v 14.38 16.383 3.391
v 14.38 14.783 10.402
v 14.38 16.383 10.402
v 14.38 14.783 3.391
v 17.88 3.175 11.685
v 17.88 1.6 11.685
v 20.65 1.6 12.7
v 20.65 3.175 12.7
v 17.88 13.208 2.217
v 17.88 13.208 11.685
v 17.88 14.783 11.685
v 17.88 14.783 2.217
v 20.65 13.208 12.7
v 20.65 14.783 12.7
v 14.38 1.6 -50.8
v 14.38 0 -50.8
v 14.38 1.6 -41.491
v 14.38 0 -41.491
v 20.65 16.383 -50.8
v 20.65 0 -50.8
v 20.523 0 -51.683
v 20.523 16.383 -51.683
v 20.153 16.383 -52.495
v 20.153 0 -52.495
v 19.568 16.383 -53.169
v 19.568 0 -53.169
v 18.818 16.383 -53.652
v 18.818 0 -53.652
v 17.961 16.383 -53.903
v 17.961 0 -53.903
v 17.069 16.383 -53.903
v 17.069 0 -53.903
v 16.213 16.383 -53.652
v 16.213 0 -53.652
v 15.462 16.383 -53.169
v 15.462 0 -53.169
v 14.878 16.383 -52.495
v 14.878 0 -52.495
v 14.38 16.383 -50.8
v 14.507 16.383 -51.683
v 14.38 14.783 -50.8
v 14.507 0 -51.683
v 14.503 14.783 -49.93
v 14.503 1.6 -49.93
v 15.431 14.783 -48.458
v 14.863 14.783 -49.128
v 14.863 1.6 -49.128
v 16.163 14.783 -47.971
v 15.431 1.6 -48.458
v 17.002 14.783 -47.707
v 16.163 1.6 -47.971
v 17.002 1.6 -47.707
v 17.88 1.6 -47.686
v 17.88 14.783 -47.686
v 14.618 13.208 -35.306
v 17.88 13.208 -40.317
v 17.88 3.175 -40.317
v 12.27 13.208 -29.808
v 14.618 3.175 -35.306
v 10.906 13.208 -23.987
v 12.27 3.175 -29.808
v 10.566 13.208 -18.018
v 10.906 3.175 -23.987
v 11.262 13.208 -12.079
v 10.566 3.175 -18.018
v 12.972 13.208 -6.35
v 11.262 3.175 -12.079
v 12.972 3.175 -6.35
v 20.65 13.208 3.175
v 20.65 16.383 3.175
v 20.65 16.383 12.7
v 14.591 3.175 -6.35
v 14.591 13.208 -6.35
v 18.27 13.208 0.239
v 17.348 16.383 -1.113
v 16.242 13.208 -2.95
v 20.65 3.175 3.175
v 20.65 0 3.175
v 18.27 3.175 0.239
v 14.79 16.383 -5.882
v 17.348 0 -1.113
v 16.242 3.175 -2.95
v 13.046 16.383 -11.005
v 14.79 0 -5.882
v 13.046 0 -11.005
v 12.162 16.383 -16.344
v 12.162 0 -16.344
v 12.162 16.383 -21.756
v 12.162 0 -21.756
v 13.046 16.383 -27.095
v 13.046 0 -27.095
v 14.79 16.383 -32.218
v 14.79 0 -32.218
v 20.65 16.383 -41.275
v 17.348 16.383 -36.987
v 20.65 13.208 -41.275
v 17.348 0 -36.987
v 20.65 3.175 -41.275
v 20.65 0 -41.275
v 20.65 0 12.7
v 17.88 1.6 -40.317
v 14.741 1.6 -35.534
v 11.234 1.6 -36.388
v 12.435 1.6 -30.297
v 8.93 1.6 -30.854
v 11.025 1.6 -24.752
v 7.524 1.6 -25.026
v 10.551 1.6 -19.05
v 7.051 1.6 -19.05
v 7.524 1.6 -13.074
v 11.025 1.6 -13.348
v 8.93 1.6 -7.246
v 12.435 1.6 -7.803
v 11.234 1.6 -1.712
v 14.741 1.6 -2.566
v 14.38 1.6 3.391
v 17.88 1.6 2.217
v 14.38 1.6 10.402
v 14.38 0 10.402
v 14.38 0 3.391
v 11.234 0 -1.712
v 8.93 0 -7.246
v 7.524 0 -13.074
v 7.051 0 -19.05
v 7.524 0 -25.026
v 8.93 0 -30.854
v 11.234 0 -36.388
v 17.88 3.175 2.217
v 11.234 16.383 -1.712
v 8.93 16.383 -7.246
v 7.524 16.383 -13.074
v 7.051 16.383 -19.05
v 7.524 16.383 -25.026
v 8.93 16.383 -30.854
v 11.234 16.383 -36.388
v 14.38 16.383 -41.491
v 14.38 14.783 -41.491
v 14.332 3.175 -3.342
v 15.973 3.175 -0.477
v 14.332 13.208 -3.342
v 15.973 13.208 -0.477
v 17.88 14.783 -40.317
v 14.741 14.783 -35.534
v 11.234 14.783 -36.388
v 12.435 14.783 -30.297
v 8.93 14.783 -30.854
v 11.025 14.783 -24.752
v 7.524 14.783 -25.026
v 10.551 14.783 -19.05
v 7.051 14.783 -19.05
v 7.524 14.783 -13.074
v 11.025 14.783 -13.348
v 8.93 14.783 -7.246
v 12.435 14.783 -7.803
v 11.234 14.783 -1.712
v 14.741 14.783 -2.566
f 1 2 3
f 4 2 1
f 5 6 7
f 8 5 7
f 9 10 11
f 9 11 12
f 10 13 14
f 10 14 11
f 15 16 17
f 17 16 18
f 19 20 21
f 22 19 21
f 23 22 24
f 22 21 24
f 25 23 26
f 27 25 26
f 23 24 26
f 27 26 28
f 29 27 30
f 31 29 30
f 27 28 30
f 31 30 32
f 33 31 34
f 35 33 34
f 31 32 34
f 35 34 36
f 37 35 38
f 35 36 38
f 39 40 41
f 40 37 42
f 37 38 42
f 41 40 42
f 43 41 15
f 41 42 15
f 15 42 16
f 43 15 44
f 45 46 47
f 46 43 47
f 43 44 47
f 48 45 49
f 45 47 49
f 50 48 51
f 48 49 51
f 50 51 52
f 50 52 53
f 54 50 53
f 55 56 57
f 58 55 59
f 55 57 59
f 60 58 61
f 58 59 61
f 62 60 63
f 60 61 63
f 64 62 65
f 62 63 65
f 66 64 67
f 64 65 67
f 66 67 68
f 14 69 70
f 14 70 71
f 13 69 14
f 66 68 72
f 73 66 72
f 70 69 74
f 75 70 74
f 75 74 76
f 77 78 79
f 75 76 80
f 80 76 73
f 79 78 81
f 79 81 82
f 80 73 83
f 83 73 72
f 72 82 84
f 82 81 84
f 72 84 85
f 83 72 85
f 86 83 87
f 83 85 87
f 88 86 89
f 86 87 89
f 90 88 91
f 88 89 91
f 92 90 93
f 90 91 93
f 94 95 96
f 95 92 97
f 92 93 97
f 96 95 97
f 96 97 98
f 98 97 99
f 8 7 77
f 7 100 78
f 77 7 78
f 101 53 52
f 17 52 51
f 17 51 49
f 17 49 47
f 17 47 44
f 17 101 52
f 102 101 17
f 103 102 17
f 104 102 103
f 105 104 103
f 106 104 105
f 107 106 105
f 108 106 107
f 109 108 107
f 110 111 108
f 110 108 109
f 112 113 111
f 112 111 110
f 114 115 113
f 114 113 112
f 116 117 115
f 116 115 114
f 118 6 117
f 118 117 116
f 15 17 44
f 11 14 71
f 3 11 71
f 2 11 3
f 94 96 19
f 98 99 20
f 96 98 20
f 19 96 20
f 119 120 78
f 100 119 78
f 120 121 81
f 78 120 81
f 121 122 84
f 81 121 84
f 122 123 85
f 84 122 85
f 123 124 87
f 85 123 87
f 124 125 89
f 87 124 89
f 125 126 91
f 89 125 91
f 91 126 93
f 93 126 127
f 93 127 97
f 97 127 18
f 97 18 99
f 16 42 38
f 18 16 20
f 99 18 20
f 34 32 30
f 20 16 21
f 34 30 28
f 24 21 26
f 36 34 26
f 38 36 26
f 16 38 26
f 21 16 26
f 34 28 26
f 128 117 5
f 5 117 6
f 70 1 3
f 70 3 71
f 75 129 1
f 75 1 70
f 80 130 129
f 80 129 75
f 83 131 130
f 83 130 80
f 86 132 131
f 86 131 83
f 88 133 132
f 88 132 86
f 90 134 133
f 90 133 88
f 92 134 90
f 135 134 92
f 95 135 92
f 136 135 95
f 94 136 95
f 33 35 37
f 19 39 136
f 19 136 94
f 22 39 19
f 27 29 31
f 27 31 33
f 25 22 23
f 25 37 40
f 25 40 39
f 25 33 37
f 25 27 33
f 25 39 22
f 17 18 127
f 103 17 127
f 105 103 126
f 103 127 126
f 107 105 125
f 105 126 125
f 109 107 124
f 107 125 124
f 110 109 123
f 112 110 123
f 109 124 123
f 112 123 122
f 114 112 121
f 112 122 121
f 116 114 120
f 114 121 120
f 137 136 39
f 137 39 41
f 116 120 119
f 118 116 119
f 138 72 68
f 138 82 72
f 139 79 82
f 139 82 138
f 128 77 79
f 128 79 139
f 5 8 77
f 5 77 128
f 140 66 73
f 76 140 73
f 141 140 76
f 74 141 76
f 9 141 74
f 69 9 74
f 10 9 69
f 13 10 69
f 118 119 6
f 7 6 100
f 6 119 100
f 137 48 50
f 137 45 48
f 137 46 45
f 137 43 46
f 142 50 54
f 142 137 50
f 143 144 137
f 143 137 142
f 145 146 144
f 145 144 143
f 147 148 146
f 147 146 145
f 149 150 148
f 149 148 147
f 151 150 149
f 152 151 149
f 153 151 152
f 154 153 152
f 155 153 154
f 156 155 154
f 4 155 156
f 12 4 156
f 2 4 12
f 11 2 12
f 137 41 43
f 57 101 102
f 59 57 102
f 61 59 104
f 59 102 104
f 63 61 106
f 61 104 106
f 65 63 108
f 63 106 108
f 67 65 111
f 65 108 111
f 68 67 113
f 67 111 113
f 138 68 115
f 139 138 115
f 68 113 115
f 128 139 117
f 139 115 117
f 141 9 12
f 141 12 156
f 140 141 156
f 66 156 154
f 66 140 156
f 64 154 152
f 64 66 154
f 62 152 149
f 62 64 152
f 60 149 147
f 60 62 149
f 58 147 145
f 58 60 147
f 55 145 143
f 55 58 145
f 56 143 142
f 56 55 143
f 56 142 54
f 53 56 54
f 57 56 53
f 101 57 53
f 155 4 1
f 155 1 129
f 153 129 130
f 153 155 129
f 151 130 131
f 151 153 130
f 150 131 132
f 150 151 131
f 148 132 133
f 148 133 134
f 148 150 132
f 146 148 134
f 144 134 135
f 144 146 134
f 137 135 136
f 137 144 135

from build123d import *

# Parameters (mm, degrees)
BOSS_EXTRU_1_DEPTH = 1.575
BOSS_EXTRU_2_DEPTH = 1.6
BOSS_EXTRU_3_START = 10.033
BOSS_EXTRU_3_DEPTH = 10.033
BOSS_EXTRU_4_START = 1.575
BOSS_EXTRU_4_DEPTH = 1.575
BOSS_EXTRU_5_DEPTH = 9.308913653
BOSS_EXTRU_6_START = 1.6
BOSS_EXTRU_6_DEPTH = 1.6
BOSS_EXTRU_7_START = -16.383
ESQUISSE8_R        = 3.134999997
BOSS_EXTRU_7_DEPTH = 16.383


with BuildPart() as part:
    # Esquisse1 → Boss.-Extru.1 (new body)
    with BuildSketch(Plane.XZ.offset(-13.208)):
        with BuildLine():
            Line((20.6502, 3.175000004), (20.6502, 12.699999997))
            Line((20.6502, 12.699999997), (17.880200006, 11.68494557))
            Line((17.880200006, 11.68494557), (17.880200006, 2.217278617))
            ThreePointArc((17.880200006, 2.217278617), (10.55088334, -19.05), (17.880200006, -40.317278617))
            Line((17.880200006, -40.317278617), (17.880200006, -41.491086347))
            Line((17.880200006, -41.491086347), (20.6502, -41.491086347))
            Line((20.6502, -41.491086347), (20.6502, -41.275000004))
            ThreePointArc((20.6502, -41.275000004), (12.05088334, -19.05), (20.6502, 3.175000004))
        make_face()
    extrude(amount=-BOSS_EXTRU_1_DEPTH)

    # Esquisse2 → Boss.-Extru.2 (add)
    with BuildSketch(Plane(origin=(0, 14.783, 0), x_dir=(-1, 0, 0), z_dir=(0, 1, 0))):
        with BuildLine():
            Line((-14.380200006, -41.491086347), (-20.6502, -41.491086347))
            Line((-20.6502, -41.491086347), (-20.6502, -41.275000004))
            ThreePointArc((-20.6502, -41.275000004), (-12.05088334, -19.05), (-20.6502, 3.175000004))
            Line((-20.6502, 3.175000004), (-20.6502, 12.699999997))
            Line((-20.6502, 12.699999997), (-14.380200006, 10.402385822))
            Line((-14.380200006, 10.402385822), (-14.380200006, 3.391086347))
            ThreePointArc((-14.380200006, 3.391086347), (-7.05088334, -19.05), (-14.380200006, -41.491086347))
        make_face()
    extrude(amount=BOSS_EXTRU_2_DEPTH)

    # Esquisse3 → Boss.-Extru.3 (add)
    with BuildSketch(Plane.XZ.offset(-13.208).offset(BOSS_EXTRU_3_START)):
        with BuildLine():
            Line((12.971967471, -6.35), (14.59088334, -6.35))
            ThreePointArc((14.59088334, -6.35), (12.536898584, -24.69448721), (20.6502, -41.275000003))
            Line((20.6502, -41.275000003), (20.6502, -41.491086346))
            Line((20.6502, -41.491086346), (17.880200006, -41.491086346))
            Line((17.880200006, -41.491086346), (17.880200006, -40.317278616))
            ThreePointArc((17.880200006, -40.317278616), (10.90572349, -23.986826144), (12.971967471, -6.35))
        make_face()
    extrude(amount=-BOSS_EXTRU_3_DEPTH)

    # Esquisse4 → Boss.-Extru.4 (add)
    with BuildSketch(Plane.XZ.offset(-3.175).offset(BOSS_EXTRU_4_START)):
        with BuildLine():
            Line((17.880200006, -41.491086347), (17.880200006, -40.317278617))
            ThreePointArc((17.880200006, -40.317278617), (10.55088334, -19.05), (17.880200006, 2.217278617))
            Line((17.880200006, 2.217278617), (17.880200006, 11.68494557))
            Line((17.880200006, 11.68494557), (20.6502, 12.699999997))
            Line((20.6502, 12.699999997), (20.6502, 3.175000004))
            ThreePointArc((20.6502, 3.175000004), (12.05088334, -19.05), (20.6502, -41.275000004))
            Line((20.6502, -41.275000004), (20.6502, -41.491086347))
            Line((20.6502, -41.491086347), (17.880200006, -41.491086347))
        make_face()
    extrude(amount=-BOSS_EXTRU_4_DEPTH)

    # Esquisse5 → Boss.-Extru.5 (add)
    with BuildSketch(Plane(origin=(0, 0, -41.491086347), x_dir=(-1, 0, 0), z_dir=(0, 0, -1))):
        Polygon((-20.6502, 1.6), (-20.6502, 16.383), (-14.380200006, 16.383), (-14.380200006, 14.783), (-17.880200006, 14.783), (-17.880200006, 1.6), align=None)
    extrude(amount=BOSS_EXTRU_5_DEPTH)

    # Esquisse6 → Boss.-Extru.6 (add)
    with BuildSketch(Plane.XZ.offset(-1.6).offset(BOSS_EXTRU_6_START)):
        with BuildLine():
            Line((20.6502, -41.275000004), (20.6502, -50.8))
            Line((20.6502, -50.8), (14.380200006, -50.8))
            Line((14.380200006, -50.8), (14.380200006, -41.491086347))
            ThreePointArc((14.380200006, -41.491086347), (7.05088334, -19.05), (14.380200006, 3.391086347))
            Line((14.380200006, 3.391086347), (14.380200006, 10.402385822))
            Line((14.380200006, 10.402385822), (20.6502, 12.699999997))
            Line((20.6502, 12.699999997), (20.6502, 3.175000004))
            ThreePointArc((20.6502, 3.175000004), (12.05088334, -19.05), (20.6502, -41.275000004))
        make_face()
    extrude(amount=-BOSS_EXTRU_6_DEPTH)

    # Esquisse8 → Boss.-Extru.7 (add)
    with BuildSketch(Plane(origin=(0, 16.383, 0), x_dir=(1, 0, 0), z_dir=(0, 1, 0)).offset(BOSS_EXTRU_7_START)):
        with Locations((17.515200003, 50.8)):
            Circle(ESQUISSE8_R)
    extrude(amount=BOSS_EXTRU_7_DEPTH)


solid = part.part
